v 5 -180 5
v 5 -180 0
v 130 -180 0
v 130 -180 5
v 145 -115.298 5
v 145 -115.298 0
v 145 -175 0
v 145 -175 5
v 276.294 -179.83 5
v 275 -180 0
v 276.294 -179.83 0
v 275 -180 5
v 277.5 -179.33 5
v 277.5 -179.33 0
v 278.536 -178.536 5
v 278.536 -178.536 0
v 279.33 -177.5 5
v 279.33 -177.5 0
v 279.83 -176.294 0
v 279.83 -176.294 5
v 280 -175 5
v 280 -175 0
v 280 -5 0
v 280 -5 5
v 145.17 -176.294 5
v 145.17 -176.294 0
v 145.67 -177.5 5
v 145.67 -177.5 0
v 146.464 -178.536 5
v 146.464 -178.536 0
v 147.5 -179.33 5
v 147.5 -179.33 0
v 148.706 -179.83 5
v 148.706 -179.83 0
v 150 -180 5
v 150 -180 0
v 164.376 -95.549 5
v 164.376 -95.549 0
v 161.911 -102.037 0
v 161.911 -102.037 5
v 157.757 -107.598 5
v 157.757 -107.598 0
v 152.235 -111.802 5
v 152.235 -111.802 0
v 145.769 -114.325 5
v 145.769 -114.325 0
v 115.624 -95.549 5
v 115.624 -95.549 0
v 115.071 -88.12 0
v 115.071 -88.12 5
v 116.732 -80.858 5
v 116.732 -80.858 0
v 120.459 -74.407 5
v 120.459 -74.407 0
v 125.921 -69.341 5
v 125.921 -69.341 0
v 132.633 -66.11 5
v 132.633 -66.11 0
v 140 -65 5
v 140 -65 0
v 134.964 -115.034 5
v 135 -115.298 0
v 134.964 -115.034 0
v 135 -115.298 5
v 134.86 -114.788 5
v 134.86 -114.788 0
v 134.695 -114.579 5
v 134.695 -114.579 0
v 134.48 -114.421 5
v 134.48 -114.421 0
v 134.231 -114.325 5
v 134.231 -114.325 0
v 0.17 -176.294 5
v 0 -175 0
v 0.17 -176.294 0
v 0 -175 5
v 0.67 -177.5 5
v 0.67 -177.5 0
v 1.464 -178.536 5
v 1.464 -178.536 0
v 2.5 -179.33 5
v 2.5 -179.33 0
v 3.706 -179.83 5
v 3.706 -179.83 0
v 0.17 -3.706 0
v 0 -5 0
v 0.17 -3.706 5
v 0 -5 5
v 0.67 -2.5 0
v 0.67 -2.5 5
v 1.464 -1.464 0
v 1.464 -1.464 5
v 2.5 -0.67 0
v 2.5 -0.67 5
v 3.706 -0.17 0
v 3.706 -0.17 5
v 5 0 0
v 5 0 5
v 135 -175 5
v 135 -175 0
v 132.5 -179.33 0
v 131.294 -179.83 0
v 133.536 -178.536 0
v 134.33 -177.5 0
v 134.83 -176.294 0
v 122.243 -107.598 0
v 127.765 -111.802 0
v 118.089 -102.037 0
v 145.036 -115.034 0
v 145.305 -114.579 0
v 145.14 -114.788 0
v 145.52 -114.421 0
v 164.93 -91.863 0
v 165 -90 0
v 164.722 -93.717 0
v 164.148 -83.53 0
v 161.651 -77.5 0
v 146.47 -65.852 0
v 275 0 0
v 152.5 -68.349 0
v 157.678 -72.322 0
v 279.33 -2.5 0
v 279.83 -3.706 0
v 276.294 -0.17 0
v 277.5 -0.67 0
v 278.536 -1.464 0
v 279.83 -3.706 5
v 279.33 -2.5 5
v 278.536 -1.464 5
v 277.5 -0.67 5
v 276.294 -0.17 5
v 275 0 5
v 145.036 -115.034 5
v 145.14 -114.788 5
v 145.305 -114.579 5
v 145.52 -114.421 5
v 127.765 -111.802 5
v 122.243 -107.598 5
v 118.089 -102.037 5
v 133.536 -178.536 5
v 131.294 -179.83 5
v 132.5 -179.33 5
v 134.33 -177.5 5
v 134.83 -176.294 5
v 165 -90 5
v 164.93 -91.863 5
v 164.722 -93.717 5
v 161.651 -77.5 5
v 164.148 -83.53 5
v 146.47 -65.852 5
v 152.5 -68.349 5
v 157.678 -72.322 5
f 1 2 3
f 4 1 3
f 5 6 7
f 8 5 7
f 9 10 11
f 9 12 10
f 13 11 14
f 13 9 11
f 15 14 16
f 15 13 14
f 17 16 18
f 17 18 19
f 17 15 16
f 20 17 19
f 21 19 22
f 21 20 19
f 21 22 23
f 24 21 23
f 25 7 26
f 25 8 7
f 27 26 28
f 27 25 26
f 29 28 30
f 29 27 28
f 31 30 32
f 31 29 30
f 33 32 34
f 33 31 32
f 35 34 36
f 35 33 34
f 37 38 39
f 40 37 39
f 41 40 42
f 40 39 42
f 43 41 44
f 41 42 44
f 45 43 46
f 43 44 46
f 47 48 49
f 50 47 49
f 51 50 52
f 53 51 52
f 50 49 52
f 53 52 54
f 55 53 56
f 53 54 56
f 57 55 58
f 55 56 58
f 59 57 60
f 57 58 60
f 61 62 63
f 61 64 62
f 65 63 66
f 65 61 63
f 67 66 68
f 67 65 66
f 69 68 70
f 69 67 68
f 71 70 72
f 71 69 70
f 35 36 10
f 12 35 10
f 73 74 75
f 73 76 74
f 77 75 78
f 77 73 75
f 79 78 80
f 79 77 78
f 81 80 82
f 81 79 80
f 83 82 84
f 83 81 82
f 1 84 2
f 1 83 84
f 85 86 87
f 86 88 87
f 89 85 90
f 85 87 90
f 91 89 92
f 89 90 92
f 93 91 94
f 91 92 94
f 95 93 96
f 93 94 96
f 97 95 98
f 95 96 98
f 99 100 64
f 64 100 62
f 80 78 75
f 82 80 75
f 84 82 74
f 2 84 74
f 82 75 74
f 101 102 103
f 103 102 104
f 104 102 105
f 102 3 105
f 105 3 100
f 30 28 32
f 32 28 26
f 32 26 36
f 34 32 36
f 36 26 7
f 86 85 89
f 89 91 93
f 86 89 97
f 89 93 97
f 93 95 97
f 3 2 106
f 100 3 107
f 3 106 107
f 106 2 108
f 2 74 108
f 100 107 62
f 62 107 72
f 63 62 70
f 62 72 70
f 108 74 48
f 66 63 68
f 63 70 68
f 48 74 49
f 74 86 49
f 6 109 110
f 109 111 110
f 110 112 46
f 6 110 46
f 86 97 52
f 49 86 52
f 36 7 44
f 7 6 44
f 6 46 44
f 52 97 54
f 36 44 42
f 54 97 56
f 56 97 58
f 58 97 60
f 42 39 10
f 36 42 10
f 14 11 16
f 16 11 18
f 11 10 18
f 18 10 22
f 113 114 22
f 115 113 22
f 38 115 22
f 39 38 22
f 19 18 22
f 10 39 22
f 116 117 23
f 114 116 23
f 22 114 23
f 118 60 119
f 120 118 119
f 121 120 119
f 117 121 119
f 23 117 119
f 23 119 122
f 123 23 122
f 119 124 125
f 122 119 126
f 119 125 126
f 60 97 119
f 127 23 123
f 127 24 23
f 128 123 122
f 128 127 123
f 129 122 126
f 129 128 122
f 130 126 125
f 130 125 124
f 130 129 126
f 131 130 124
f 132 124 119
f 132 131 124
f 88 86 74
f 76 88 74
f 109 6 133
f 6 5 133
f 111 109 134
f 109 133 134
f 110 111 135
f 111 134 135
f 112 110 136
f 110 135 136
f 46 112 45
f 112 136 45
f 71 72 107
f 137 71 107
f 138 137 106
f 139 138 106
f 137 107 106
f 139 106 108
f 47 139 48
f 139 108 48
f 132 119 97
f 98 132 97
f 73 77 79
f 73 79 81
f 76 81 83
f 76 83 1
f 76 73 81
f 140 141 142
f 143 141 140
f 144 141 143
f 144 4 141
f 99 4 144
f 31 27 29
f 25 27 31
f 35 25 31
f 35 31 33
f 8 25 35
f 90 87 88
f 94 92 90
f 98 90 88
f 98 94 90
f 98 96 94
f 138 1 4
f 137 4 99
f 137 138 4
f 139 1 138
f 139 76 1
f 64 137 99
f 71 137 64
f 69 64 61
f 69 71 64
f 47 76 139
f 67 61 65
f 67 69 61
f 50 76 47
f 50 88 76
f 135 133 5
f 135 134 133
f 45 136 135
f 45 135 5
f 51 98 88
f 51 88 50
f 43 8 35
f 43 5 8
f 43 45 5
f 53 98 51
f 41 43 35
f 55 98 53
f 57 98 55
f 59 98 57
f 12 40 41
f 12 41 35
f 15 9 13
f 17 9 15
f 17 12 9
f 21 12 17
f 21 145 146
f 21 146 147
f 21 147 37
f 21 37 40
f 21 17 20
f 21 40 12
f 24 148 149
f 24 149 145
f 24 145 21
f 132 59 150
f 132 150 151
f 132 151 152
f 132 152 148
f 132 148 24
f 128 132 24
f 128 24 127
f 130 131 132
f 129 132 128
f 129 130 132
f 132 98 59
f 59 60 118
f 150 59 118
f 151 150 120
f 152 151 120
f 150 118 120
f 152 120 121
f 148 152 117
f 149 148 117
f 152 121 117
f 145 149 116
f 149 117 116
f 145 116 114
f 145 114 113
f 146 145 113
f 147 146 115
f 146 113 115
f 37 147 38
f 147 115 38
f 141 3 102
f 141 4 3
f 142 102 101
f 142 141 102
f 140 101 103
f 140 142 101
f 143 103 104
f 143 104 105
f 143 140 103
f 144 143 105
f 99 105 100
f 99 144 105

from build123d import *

# Parameters (mm, degrees)
F1_DEPTH = 5
F2_R     = 5
F3_R     = 1


with BuildPart() as f1:
    # F0 (on Top) → F1 (new body)
    with BuildSketch(Plane.XY):
        with BuildLine():
            Line((140, 0), (0, 0))
            Line((0, 0), (0, -95.548943))
            Line((0, -95.548943), (115.623593, -95.548943))
            ThreePointArc((115.623593, -95.548943), (120.458716, -74.40711), (140, -65))
            Line((140, -65), (140, 0))
        make_face()
        with BuildLine():
            Line((280, 0), (140, 0))
            Line((140, 0), (140, -65))
            ThreePointArc((140, -65), (157.67767, -72.32233), (165, -90))
            ThreePointArc((165, -90), (164.843613, -92.791936), (164.376407, -95.548943))
            Line((164.376407, -95.548943), (280, -95.548943))
            Line((280, -95.548943), (280, 0))
        make_face()
        with BuildLine():
            Line((280, -180), (280, -95.548943))
            Line((280, -95.548943), (164.376407, -95.548943))
            ThreePointArc((164.376407, -95.548943), (157.478004, -107.875105), (145, -114.494897))
            Line((145, -114.494897), (145, -180))
            Line((145, -180), (280, -180))
        make_face()
        with BuildLine():
            Line((115.623593, -95.548943), (0, -95.548943))
            Line((0, -95.548943), (0, -180))
            Line((0, -180), (135, -180))
            Line((135, -180), (135, -114.494897))
            ThreePointArc((135, -114.494897), (122.521996, -107.875105), (115.623593, -95.548943))
        make_face()
    extrude(amount=F1_DEPTH)

    # F2
    f2_edges = [f1.edges().sort_by_distance(p)[0] for p in [
        (135, -180, 2.5),
        (145, -180, 2.5),
        (280, -180, 2.5),
        (0, -180, 2.5),
        (280, 0, 2.5),
        (0, 0, 2.5),
    ]]
    fillet(f2_edges, radius=F2_R)

    # F3
    f3_edges = [f1.edges().sort_by_distance(p)[0] for p in [
        (135, -114.494897, 2.5),
        (145, -114.494897, 2.5),
    ]]
    fillet(f3_edges, radius=F3_R)


solid = f1.part
